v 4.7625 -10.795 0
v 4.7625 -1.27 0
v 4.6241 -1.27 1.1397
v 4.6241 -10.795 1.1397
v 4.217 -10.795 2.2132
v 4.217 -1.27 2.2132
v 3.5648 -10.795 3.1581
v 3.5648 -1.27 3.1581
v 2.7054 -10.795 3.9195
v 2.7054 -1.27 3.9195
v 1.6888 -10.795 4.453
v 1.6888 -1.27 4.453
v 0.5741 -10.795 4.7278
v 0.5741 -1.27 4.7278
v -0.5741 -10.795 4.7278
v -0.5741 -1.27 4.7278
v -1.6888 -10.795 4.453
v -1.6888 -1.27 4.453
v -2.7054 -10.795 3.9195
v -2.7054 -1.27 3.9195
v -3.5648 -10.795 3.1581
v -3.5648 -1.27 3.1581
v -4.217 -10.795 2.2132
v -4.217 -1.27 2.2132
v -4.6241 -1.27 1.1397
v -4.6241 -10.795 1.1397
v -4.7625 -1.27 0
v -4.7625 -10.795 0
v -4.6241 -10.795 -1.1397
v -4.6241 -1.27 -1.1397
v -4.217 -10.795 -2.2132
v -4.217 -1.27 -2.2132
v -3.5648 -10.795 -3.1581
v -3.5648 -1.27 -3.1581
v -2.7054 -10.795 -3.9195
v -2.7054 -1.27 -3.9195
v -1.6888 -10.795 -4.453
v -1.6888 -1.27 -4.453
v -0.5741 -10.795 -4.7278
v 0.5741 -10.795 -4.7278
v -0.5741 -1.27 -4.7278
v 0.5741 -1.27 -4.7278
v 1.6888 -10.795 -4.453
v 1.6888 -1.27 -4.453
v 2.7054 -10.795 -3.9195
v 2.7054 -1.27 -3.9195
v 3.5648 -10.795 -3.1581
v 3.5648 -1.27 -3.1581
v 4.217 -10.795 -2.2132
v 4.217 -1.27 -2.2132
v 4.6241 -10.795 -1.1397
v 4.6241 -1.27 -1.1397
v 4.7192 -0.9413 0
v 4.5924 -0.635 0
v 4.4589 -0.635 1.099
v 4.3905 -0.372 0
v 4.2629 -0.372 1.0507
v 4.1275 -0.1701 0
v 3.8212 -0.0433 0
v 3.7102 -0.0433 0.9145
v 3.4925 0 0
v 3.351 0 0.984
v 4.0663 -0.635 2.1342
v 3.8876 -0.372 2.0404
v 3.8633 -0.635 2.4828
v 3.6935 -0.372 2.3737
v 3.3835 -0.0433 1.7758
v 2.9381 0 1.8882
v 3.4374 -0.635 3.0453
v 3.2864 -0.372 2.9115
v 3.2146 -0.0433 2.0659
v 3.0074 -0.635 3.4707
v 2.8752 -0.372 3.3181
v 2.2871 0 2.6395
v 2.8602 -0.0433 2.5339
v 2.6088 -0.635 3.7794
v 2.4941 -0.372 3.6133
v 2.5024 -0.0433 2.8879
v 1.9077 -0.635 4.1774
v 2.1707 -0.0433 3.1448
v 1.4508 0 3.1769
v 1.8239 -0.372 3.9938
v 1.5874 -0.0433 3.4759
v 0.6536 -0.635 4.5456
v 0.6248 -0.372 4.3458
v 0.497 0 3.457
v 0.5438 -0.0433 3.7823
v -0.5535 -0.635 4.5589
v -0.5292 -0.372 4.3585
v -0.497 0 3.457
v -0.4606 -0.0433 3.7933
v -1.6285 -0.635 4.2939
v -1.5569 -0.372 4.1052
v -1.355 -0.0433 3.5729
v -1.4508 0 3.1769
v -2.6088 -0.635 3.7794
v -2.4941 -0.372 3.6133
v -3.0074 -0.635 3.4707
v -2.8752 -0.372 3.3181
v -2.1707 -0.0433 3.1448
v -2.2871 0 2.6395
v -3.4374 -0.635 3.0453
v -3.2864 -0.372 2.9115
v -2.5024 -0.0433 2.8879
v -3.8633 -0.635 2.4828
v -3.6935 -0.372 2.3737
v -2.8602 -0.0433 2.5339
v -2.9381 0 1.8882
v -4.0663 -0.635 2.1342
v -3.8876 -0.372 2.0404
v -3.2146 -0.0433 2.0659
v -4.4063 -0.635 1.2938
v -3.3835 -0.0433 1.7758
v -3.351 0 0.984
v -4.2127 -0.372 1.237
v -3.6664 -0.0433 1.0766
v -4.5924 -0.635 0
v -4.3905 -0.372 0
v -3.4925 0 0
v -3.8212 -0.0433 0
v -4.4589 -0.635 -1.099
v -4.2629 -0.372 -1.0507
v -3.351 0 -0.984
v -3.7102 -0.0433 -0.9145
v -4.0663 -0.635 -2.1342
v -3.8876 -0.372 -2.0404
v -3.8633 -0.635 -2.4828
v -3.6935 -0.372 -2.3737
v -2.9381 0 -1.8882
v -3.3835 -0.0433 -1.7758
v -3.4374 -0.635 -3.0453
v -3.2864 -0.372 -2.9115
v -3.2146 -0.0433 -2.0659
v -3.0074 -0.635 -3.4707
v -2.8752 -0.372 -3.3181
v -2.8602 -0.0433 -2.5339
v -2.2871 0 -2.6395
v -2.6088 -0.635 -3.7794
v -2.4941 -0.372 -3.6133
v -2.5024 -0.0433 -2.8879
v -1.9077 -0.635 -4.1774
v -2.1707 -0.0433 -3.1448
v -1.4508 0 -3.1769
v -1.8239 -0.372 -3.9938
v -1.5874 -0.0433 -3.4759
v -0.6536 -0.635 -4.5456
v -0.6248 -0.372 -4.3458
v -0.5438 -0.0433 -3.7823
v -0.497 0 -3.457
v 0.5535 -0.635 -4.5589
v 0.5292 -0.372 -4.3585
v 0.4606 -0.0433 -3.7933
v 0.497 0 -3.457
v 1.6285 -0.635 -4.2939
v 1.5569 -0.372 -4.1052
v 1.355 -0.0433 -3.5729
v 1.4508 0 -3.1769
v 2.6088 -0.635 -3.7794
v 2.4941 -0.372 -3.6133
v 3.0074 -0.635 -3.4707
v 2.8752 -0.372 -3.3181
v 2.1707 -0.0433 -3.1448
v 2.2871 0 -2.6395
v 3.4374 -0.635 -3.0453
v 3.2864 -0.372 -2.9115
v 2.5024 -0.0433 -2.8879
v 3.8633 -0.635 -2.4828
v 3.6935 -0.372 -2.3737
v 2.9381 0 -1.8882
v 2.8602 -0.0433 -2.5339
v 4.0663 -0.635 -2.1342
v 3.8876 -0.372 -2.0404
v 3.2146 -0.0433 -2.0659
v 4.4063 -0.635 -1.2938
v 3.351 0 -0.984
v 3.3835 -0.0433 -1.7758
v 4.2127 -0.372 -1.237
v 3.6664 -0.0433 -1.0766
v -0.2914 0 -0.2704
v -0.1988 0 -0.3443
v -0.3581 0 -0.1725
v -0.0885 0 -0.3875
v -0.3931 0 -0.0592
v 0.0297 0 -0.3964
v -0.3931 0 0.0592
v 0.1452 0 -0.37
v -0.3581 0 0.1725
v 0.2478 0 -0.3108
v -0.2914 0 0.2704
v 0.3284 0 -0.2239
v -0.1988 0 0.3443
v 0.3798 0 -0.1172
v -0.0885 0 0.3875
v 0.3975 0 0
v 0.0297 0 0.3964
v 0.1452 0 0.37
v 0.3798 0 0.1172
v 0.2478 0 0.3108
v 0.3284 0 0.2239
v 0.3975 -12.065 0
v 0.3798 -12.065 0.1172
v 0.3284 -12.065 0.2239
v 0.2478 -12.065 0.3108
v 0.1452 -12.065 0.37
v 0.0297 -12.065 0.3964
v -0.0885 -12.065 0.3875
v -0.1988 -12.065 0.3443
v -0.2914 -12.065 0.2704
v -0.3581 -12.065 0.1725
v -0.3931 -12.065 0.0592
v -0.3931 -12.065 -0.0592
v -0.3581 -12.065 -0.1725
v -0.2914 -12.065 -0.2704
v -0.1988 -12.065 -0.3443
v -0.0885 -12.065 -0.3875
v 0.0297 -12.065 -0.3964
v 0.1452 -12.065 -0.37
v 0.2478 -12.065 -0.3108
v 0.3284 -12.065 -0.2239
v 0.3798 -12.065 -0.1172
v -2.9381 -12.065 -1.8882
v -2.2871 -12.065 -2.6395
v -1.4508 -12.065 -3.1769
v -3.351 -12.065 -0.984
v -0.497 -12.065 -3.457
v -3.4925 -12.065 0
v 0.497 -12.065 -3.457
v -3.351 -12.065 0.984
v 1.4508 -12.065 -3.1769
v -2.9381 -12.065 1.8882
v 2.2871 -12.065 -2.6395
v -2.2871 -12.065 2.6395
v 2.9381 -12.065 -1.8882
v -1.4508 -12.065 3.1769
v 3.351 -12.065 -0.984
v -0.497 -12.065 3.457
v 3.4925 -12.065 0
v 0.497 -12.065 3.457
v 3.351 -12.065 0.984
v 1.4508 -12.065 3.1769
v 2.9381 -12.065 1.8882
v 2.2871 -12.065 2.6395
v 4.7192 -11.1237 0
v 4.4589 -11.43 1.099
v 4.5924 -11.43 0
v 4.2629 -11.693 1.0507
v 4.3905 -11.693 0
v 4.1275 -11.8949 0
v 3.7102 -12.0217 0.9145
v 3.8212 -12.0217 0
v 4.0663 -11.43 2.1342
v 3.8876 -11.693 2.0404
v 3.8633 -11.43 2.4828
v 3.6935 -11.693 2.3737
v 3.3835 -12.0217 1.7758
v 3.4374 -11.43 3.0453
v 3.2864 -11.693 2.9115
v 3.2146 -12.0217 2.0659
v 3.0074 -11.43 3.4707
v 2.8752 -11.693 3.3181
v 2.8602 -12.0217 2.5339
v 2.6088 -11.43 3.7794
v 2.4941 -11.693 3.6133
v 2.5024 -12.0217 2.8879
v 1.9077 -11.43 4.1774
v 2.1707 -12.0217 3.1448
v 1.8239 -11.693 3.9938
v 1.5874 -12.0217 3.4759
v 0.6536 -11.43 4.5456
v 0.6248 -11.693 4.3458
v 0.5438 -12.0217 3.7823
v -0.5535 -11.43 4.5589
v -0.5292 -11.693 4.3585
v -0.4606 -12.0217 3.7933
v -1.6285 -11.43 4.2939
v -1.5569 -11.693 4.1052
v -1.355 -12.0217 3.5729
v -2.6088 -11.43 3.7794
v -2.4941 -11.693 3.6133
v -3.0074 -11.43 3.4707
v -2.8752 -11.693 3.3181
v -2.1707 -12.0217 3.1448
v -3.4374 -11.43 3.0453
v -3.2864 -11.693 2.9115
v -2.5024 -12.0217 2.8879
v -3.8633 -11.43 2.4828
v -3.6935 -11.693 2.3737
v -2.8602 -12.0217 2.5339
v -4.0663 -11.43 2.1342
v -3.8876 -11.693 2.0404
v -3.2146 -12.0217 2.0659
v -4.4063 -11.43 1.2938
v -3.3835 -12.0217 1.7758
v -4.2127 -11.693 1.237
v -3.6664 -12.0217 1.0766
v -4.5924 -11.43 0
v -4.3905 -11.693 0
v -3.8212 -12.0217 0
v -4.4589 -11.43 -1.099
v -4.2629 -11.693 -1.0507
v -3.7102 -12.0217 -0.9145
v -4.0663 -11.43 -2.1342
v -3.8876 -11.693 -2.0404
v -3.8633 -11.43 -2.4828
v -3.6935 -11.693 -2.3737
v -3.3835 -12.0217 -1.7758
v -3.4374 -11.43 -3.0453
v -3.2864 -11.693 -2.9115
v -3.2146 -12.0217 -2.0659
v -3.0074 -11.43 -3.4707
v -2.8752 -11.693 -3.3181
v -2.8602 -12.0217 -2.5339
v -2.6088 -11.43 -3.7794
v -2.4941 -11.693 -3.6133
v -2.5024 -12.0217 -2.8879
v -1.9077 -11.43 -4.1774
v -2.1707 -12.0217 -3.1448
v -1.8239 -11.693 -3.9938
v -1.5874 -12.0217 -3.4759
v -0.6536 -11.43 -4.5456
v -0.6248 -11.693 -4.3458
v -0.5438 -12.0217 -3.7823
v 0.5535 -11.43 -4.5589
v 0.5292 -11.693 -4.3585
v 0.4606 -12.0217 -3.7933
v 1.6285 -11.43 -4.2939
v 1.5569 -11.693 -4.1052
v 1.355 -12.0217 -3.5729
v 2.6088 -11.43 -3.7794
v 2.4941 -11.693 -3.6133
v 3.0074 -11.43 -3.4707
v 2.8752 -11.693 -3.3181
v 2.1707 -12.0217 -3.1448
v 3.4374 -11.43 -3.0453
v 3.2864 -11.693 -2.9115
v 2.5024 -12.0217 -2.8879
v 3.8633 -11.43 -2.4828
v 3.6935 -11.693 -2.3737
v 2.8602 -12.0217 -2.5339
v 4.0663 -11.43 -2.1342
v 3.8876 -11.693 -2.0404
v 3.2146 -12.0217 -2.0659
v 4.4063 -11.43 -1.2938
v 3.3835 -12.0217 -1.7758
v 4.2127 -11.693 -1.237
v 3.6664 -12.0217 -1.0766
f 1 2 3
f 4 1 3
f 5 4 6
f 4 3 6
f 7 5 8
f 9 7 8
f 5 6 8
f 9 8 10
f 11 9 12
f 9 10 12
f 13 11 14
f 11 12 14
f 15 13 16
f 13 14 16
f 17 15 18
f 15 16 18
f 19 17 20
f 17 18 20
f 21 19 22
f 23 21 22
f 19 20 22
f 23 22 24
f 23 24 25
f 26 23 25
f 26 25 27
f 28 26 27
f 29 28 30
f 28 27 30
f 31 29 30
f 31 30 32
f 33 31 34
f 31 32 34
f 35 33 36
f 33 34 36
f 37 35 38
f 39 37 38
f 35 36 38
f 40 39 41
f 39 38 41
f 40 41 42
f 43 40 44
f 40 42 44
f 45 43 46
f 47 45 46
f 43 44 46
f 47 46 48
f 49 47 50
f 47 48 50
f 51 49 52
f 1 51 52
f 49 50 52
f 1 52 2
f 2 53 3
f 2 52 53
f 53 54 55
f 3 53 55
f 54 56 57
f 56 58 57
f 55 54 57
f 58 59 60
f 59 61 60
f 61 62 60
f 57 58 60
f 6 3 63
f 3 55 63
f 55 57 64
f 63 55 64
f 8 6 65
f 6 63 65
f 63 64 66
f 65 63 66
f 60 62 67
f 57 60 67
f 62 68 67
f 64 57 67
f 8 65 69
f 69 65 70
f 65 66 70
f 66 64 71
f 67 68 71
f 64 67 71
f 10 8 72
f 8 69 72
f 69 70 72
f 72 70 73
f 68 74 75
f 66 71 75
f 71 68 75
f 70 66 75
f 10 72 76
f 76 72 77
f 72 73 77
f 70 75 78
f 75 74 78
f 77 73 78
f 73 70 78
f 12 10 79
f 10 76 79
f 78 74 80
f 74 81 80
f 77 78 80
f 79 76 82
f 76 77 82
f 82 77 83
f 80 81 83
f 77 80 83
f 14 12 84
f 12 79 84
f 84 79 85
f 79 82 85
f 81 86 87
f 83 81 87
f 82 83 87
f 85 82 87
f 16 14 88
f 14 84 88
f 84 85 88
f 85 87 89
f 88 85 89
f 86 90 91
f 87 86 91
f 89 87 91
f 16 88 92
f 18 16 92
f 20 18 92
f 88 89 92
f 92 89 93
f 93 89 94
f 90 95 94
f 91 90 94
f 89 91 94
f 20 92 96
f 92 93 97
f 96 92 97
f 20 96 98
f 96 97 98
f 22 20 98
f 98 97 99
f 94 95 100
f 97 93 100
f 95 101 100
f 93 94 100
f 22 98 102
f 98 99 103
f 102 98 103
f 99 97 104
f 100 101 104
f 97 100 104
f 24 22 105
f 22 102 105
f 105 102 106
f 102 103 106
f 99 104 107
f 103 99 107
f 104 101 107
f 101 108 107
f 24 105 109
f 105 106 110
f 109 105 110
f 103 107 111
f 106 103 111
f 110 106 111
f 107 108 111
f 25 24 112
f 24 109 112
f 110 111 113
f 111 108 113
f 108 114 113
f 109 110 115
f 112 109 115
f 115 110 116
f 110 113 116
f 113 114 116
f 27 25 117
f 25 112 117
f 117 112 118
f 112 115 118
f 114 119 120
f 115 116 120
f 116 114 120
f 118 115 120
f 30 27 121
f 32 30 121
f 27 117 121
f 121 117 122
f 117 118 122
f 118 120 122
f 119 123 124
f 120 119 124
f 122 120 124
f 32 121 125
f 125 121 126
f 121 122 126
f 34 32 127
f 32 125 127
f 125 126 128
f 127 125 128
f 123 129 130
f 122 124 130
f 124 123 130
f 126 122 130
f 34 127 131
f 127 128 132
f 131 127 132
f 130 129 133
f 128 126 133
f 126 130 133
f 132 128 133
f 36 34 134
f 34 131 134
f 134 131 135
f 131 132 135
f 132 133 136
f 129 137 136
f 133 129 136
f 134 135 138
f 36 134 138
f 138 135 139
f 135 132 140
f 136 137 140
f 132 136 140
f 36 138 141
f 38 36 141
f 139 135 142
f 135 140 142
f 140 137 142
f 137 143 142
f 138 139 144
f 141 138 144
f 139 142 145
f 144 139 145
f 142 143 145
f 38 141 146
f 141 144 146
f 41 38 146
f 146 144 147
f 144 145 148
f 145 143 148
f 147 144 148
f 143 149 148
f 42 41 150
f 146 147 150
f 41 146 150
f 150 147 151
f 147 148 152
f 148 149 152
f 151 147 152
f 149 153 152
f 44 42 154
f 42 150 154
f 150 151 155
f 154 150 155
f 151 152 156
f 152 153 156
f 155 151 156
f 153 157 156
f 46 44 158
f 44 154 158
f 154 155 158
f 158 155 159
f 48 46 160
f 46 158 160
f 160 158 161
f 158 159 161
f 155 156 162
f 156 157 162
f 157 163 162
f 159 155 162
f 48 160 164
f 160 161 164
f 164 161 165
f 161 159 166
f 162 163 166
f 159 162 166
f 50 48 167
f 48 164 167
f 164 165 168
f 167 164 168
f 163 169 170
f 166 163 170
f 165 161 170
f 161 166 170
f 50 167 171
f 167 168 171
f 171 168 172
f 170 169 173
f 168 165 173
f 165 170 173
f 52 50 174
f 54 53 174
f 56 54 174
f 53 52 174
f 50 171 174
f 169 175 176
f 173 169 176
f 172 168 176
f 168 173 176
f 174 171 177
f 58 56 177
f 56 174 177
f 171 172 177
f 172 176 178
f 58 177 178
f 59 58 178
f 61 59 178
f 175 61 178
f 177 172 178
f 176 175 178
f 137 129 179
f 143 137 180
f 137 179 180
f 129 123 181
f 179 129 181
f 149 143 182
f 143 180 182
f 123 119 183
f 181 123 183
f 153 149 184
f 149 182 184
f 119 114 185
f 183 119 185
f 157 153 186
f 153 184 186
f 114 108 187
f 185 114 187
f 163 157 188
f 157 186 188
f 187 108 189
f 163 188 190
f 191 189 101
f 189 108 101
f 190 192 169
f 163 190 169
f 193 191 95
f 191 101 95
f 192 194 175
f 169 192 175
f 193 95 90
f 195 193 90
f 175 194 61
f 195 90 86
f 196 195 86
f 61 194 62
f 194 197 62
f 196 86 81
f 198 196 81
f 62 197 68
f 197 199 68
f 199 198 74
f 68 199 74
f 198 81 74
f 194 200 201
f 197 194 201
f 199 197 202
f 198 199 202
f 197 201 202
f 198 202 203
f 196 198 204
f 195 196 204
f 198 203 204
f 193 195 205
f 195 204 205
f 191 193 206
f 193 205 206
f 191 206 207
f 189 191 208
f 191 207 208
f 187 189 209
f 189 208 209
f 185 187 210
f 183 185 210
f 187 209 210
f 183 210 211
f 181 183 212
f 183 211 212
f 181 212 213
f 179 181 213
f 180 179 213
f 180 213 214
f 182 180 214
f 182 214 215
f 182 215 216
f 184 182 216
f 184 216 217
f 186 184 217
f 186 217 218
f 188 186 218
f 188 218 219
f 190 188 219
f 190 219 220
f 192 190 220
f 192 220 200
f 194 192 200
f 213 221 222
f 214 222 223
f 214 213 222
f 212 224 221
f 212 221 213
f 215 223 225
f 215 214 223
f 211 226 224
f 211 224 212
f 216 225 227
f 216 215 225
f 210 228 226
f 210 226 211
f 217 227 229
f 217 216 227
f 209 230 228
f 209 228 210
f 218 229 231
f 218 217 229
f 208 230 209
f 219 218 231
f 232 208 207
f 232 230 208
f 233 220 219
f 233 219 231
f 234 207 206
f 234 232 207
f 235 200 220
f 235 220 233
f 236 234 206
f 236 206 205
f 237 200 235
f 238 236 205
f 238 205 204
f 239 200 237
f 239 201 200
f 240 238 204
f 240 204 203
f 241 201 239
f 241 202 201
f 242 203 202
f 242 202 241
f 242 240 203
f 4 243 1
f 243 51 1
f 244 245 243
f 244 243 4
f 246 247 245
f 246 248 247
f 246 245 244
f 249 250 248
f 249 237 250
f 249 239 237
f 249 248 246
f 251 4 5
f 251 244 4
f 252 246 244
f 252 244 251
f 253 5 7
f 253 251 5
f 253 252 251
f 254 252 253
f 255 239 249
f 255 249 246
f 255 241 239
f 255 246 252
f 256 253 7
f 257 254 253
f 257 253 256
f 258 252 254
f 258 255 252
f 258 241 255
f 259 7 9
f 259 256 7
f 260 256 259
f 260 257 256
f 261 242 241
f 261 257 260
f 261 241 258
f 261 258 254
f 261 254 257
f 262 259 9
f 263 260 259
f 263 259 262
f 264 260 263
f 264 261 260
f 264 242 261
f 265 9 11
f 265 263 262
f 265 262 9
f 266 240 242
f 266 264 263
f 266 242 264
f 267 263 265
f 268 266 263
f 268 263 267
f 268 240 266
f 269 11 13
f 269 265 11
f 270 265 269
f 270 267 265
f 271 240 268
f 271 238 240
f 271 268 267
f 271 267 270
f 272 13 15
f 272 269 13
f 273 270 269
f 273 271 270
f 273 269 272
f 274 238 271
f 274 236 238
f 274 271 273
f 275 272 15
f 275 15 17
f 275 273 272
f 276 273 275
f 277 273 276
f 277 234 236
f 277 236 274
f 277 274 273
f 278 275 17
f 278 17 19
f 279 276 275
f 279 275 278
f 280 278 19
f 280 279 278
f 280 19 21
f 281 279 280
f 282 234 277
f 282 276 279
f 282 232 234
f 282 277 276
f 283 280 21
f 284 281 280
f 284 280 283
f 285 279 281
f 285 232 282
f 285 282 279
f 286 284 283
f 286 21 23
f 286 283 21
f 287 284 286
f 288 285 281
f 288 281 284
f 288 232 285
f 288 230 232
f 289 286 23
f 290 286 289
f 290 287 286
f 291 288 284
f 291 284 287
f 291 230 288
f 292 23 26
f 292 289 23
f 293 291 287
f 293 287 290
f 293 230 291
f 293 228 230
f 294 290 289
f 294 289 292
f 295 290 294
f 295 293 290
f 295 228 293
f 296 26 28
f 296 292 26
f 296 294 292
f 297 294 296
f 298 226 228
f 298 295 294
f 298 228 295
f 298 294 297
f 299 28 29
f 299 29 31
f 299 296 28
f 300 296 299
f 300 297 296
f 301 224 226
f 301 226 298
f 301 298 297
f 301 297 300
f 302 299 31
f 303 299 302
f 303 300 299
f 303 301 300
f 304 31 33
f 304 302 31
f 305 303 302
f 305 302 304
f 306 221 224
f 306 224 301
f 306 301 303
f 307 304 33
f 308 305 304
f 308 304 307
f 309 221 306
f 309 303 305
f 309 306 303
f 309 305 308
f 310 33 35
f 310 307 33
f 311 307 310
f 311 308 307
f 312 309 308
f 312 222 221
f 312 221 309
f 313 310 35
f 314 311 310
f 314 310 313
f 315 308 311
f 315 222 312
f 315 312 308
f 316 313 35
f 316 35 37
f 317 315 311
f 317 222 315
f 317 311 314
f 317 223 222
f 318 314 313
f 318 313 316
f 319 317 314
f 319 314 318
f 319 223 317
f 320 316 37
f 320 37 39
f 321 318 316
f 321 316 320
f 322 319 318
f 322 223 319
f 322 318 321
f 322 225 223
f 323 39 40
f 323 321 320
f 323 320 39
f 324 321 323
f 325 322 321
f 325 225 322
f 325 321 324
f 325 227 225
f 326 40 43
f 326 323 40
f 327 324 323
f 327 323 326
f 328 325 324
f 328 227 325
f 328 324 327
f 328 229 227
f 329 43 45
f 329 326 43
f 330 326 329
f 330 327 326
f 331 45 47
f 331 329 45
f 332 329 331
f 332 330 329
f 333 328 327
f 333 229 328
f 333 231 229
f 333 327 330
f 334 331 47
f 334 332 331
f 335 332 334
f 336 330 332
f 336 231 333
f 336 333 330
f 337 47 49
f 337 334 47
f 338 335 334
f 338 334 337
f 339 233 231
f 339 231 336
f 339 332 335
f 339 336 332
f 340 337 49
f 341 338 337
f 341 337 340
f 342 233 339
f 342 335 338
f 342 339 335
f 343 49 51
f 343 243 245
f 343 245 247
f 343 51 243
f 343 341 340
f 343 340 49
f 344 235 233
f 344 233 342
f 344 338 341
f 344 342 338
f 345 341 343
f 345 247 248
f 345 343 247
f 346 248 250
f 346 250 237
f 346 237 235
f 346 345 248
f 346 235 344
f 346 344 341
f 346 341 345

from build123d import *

# Parameters (mm, degrees)
F0_R     = 4.7625
F1_DEPTH = 12.065
F2_R     = 1.27
F4_D     = 0.79502


with BuildPart() as f1:
    # F0 (on Front) → F1 (new body)
    with BuildSketch(Plane.XZ):
        Circle(F0_R)
    extrude(amount=F1_DEPTH)

    # F2
    f2_edges = [f1.edges().sort_by_distance(p)[0] for p in [
        (-4.7625, -12.065, 0),
        (-4.7625, 0, 0),
    ]]
    fillet(f2_edges, radius=F2_R)

    # F4 (through all)
    with Locations(Plane(origin=(0, 0, 0), x_dir=(-1, 0, 0), z_dir=(0, 1, 0))):
        with Locations((0, 0)):
            Hole(F4_D / 2)


solid = f1.part
